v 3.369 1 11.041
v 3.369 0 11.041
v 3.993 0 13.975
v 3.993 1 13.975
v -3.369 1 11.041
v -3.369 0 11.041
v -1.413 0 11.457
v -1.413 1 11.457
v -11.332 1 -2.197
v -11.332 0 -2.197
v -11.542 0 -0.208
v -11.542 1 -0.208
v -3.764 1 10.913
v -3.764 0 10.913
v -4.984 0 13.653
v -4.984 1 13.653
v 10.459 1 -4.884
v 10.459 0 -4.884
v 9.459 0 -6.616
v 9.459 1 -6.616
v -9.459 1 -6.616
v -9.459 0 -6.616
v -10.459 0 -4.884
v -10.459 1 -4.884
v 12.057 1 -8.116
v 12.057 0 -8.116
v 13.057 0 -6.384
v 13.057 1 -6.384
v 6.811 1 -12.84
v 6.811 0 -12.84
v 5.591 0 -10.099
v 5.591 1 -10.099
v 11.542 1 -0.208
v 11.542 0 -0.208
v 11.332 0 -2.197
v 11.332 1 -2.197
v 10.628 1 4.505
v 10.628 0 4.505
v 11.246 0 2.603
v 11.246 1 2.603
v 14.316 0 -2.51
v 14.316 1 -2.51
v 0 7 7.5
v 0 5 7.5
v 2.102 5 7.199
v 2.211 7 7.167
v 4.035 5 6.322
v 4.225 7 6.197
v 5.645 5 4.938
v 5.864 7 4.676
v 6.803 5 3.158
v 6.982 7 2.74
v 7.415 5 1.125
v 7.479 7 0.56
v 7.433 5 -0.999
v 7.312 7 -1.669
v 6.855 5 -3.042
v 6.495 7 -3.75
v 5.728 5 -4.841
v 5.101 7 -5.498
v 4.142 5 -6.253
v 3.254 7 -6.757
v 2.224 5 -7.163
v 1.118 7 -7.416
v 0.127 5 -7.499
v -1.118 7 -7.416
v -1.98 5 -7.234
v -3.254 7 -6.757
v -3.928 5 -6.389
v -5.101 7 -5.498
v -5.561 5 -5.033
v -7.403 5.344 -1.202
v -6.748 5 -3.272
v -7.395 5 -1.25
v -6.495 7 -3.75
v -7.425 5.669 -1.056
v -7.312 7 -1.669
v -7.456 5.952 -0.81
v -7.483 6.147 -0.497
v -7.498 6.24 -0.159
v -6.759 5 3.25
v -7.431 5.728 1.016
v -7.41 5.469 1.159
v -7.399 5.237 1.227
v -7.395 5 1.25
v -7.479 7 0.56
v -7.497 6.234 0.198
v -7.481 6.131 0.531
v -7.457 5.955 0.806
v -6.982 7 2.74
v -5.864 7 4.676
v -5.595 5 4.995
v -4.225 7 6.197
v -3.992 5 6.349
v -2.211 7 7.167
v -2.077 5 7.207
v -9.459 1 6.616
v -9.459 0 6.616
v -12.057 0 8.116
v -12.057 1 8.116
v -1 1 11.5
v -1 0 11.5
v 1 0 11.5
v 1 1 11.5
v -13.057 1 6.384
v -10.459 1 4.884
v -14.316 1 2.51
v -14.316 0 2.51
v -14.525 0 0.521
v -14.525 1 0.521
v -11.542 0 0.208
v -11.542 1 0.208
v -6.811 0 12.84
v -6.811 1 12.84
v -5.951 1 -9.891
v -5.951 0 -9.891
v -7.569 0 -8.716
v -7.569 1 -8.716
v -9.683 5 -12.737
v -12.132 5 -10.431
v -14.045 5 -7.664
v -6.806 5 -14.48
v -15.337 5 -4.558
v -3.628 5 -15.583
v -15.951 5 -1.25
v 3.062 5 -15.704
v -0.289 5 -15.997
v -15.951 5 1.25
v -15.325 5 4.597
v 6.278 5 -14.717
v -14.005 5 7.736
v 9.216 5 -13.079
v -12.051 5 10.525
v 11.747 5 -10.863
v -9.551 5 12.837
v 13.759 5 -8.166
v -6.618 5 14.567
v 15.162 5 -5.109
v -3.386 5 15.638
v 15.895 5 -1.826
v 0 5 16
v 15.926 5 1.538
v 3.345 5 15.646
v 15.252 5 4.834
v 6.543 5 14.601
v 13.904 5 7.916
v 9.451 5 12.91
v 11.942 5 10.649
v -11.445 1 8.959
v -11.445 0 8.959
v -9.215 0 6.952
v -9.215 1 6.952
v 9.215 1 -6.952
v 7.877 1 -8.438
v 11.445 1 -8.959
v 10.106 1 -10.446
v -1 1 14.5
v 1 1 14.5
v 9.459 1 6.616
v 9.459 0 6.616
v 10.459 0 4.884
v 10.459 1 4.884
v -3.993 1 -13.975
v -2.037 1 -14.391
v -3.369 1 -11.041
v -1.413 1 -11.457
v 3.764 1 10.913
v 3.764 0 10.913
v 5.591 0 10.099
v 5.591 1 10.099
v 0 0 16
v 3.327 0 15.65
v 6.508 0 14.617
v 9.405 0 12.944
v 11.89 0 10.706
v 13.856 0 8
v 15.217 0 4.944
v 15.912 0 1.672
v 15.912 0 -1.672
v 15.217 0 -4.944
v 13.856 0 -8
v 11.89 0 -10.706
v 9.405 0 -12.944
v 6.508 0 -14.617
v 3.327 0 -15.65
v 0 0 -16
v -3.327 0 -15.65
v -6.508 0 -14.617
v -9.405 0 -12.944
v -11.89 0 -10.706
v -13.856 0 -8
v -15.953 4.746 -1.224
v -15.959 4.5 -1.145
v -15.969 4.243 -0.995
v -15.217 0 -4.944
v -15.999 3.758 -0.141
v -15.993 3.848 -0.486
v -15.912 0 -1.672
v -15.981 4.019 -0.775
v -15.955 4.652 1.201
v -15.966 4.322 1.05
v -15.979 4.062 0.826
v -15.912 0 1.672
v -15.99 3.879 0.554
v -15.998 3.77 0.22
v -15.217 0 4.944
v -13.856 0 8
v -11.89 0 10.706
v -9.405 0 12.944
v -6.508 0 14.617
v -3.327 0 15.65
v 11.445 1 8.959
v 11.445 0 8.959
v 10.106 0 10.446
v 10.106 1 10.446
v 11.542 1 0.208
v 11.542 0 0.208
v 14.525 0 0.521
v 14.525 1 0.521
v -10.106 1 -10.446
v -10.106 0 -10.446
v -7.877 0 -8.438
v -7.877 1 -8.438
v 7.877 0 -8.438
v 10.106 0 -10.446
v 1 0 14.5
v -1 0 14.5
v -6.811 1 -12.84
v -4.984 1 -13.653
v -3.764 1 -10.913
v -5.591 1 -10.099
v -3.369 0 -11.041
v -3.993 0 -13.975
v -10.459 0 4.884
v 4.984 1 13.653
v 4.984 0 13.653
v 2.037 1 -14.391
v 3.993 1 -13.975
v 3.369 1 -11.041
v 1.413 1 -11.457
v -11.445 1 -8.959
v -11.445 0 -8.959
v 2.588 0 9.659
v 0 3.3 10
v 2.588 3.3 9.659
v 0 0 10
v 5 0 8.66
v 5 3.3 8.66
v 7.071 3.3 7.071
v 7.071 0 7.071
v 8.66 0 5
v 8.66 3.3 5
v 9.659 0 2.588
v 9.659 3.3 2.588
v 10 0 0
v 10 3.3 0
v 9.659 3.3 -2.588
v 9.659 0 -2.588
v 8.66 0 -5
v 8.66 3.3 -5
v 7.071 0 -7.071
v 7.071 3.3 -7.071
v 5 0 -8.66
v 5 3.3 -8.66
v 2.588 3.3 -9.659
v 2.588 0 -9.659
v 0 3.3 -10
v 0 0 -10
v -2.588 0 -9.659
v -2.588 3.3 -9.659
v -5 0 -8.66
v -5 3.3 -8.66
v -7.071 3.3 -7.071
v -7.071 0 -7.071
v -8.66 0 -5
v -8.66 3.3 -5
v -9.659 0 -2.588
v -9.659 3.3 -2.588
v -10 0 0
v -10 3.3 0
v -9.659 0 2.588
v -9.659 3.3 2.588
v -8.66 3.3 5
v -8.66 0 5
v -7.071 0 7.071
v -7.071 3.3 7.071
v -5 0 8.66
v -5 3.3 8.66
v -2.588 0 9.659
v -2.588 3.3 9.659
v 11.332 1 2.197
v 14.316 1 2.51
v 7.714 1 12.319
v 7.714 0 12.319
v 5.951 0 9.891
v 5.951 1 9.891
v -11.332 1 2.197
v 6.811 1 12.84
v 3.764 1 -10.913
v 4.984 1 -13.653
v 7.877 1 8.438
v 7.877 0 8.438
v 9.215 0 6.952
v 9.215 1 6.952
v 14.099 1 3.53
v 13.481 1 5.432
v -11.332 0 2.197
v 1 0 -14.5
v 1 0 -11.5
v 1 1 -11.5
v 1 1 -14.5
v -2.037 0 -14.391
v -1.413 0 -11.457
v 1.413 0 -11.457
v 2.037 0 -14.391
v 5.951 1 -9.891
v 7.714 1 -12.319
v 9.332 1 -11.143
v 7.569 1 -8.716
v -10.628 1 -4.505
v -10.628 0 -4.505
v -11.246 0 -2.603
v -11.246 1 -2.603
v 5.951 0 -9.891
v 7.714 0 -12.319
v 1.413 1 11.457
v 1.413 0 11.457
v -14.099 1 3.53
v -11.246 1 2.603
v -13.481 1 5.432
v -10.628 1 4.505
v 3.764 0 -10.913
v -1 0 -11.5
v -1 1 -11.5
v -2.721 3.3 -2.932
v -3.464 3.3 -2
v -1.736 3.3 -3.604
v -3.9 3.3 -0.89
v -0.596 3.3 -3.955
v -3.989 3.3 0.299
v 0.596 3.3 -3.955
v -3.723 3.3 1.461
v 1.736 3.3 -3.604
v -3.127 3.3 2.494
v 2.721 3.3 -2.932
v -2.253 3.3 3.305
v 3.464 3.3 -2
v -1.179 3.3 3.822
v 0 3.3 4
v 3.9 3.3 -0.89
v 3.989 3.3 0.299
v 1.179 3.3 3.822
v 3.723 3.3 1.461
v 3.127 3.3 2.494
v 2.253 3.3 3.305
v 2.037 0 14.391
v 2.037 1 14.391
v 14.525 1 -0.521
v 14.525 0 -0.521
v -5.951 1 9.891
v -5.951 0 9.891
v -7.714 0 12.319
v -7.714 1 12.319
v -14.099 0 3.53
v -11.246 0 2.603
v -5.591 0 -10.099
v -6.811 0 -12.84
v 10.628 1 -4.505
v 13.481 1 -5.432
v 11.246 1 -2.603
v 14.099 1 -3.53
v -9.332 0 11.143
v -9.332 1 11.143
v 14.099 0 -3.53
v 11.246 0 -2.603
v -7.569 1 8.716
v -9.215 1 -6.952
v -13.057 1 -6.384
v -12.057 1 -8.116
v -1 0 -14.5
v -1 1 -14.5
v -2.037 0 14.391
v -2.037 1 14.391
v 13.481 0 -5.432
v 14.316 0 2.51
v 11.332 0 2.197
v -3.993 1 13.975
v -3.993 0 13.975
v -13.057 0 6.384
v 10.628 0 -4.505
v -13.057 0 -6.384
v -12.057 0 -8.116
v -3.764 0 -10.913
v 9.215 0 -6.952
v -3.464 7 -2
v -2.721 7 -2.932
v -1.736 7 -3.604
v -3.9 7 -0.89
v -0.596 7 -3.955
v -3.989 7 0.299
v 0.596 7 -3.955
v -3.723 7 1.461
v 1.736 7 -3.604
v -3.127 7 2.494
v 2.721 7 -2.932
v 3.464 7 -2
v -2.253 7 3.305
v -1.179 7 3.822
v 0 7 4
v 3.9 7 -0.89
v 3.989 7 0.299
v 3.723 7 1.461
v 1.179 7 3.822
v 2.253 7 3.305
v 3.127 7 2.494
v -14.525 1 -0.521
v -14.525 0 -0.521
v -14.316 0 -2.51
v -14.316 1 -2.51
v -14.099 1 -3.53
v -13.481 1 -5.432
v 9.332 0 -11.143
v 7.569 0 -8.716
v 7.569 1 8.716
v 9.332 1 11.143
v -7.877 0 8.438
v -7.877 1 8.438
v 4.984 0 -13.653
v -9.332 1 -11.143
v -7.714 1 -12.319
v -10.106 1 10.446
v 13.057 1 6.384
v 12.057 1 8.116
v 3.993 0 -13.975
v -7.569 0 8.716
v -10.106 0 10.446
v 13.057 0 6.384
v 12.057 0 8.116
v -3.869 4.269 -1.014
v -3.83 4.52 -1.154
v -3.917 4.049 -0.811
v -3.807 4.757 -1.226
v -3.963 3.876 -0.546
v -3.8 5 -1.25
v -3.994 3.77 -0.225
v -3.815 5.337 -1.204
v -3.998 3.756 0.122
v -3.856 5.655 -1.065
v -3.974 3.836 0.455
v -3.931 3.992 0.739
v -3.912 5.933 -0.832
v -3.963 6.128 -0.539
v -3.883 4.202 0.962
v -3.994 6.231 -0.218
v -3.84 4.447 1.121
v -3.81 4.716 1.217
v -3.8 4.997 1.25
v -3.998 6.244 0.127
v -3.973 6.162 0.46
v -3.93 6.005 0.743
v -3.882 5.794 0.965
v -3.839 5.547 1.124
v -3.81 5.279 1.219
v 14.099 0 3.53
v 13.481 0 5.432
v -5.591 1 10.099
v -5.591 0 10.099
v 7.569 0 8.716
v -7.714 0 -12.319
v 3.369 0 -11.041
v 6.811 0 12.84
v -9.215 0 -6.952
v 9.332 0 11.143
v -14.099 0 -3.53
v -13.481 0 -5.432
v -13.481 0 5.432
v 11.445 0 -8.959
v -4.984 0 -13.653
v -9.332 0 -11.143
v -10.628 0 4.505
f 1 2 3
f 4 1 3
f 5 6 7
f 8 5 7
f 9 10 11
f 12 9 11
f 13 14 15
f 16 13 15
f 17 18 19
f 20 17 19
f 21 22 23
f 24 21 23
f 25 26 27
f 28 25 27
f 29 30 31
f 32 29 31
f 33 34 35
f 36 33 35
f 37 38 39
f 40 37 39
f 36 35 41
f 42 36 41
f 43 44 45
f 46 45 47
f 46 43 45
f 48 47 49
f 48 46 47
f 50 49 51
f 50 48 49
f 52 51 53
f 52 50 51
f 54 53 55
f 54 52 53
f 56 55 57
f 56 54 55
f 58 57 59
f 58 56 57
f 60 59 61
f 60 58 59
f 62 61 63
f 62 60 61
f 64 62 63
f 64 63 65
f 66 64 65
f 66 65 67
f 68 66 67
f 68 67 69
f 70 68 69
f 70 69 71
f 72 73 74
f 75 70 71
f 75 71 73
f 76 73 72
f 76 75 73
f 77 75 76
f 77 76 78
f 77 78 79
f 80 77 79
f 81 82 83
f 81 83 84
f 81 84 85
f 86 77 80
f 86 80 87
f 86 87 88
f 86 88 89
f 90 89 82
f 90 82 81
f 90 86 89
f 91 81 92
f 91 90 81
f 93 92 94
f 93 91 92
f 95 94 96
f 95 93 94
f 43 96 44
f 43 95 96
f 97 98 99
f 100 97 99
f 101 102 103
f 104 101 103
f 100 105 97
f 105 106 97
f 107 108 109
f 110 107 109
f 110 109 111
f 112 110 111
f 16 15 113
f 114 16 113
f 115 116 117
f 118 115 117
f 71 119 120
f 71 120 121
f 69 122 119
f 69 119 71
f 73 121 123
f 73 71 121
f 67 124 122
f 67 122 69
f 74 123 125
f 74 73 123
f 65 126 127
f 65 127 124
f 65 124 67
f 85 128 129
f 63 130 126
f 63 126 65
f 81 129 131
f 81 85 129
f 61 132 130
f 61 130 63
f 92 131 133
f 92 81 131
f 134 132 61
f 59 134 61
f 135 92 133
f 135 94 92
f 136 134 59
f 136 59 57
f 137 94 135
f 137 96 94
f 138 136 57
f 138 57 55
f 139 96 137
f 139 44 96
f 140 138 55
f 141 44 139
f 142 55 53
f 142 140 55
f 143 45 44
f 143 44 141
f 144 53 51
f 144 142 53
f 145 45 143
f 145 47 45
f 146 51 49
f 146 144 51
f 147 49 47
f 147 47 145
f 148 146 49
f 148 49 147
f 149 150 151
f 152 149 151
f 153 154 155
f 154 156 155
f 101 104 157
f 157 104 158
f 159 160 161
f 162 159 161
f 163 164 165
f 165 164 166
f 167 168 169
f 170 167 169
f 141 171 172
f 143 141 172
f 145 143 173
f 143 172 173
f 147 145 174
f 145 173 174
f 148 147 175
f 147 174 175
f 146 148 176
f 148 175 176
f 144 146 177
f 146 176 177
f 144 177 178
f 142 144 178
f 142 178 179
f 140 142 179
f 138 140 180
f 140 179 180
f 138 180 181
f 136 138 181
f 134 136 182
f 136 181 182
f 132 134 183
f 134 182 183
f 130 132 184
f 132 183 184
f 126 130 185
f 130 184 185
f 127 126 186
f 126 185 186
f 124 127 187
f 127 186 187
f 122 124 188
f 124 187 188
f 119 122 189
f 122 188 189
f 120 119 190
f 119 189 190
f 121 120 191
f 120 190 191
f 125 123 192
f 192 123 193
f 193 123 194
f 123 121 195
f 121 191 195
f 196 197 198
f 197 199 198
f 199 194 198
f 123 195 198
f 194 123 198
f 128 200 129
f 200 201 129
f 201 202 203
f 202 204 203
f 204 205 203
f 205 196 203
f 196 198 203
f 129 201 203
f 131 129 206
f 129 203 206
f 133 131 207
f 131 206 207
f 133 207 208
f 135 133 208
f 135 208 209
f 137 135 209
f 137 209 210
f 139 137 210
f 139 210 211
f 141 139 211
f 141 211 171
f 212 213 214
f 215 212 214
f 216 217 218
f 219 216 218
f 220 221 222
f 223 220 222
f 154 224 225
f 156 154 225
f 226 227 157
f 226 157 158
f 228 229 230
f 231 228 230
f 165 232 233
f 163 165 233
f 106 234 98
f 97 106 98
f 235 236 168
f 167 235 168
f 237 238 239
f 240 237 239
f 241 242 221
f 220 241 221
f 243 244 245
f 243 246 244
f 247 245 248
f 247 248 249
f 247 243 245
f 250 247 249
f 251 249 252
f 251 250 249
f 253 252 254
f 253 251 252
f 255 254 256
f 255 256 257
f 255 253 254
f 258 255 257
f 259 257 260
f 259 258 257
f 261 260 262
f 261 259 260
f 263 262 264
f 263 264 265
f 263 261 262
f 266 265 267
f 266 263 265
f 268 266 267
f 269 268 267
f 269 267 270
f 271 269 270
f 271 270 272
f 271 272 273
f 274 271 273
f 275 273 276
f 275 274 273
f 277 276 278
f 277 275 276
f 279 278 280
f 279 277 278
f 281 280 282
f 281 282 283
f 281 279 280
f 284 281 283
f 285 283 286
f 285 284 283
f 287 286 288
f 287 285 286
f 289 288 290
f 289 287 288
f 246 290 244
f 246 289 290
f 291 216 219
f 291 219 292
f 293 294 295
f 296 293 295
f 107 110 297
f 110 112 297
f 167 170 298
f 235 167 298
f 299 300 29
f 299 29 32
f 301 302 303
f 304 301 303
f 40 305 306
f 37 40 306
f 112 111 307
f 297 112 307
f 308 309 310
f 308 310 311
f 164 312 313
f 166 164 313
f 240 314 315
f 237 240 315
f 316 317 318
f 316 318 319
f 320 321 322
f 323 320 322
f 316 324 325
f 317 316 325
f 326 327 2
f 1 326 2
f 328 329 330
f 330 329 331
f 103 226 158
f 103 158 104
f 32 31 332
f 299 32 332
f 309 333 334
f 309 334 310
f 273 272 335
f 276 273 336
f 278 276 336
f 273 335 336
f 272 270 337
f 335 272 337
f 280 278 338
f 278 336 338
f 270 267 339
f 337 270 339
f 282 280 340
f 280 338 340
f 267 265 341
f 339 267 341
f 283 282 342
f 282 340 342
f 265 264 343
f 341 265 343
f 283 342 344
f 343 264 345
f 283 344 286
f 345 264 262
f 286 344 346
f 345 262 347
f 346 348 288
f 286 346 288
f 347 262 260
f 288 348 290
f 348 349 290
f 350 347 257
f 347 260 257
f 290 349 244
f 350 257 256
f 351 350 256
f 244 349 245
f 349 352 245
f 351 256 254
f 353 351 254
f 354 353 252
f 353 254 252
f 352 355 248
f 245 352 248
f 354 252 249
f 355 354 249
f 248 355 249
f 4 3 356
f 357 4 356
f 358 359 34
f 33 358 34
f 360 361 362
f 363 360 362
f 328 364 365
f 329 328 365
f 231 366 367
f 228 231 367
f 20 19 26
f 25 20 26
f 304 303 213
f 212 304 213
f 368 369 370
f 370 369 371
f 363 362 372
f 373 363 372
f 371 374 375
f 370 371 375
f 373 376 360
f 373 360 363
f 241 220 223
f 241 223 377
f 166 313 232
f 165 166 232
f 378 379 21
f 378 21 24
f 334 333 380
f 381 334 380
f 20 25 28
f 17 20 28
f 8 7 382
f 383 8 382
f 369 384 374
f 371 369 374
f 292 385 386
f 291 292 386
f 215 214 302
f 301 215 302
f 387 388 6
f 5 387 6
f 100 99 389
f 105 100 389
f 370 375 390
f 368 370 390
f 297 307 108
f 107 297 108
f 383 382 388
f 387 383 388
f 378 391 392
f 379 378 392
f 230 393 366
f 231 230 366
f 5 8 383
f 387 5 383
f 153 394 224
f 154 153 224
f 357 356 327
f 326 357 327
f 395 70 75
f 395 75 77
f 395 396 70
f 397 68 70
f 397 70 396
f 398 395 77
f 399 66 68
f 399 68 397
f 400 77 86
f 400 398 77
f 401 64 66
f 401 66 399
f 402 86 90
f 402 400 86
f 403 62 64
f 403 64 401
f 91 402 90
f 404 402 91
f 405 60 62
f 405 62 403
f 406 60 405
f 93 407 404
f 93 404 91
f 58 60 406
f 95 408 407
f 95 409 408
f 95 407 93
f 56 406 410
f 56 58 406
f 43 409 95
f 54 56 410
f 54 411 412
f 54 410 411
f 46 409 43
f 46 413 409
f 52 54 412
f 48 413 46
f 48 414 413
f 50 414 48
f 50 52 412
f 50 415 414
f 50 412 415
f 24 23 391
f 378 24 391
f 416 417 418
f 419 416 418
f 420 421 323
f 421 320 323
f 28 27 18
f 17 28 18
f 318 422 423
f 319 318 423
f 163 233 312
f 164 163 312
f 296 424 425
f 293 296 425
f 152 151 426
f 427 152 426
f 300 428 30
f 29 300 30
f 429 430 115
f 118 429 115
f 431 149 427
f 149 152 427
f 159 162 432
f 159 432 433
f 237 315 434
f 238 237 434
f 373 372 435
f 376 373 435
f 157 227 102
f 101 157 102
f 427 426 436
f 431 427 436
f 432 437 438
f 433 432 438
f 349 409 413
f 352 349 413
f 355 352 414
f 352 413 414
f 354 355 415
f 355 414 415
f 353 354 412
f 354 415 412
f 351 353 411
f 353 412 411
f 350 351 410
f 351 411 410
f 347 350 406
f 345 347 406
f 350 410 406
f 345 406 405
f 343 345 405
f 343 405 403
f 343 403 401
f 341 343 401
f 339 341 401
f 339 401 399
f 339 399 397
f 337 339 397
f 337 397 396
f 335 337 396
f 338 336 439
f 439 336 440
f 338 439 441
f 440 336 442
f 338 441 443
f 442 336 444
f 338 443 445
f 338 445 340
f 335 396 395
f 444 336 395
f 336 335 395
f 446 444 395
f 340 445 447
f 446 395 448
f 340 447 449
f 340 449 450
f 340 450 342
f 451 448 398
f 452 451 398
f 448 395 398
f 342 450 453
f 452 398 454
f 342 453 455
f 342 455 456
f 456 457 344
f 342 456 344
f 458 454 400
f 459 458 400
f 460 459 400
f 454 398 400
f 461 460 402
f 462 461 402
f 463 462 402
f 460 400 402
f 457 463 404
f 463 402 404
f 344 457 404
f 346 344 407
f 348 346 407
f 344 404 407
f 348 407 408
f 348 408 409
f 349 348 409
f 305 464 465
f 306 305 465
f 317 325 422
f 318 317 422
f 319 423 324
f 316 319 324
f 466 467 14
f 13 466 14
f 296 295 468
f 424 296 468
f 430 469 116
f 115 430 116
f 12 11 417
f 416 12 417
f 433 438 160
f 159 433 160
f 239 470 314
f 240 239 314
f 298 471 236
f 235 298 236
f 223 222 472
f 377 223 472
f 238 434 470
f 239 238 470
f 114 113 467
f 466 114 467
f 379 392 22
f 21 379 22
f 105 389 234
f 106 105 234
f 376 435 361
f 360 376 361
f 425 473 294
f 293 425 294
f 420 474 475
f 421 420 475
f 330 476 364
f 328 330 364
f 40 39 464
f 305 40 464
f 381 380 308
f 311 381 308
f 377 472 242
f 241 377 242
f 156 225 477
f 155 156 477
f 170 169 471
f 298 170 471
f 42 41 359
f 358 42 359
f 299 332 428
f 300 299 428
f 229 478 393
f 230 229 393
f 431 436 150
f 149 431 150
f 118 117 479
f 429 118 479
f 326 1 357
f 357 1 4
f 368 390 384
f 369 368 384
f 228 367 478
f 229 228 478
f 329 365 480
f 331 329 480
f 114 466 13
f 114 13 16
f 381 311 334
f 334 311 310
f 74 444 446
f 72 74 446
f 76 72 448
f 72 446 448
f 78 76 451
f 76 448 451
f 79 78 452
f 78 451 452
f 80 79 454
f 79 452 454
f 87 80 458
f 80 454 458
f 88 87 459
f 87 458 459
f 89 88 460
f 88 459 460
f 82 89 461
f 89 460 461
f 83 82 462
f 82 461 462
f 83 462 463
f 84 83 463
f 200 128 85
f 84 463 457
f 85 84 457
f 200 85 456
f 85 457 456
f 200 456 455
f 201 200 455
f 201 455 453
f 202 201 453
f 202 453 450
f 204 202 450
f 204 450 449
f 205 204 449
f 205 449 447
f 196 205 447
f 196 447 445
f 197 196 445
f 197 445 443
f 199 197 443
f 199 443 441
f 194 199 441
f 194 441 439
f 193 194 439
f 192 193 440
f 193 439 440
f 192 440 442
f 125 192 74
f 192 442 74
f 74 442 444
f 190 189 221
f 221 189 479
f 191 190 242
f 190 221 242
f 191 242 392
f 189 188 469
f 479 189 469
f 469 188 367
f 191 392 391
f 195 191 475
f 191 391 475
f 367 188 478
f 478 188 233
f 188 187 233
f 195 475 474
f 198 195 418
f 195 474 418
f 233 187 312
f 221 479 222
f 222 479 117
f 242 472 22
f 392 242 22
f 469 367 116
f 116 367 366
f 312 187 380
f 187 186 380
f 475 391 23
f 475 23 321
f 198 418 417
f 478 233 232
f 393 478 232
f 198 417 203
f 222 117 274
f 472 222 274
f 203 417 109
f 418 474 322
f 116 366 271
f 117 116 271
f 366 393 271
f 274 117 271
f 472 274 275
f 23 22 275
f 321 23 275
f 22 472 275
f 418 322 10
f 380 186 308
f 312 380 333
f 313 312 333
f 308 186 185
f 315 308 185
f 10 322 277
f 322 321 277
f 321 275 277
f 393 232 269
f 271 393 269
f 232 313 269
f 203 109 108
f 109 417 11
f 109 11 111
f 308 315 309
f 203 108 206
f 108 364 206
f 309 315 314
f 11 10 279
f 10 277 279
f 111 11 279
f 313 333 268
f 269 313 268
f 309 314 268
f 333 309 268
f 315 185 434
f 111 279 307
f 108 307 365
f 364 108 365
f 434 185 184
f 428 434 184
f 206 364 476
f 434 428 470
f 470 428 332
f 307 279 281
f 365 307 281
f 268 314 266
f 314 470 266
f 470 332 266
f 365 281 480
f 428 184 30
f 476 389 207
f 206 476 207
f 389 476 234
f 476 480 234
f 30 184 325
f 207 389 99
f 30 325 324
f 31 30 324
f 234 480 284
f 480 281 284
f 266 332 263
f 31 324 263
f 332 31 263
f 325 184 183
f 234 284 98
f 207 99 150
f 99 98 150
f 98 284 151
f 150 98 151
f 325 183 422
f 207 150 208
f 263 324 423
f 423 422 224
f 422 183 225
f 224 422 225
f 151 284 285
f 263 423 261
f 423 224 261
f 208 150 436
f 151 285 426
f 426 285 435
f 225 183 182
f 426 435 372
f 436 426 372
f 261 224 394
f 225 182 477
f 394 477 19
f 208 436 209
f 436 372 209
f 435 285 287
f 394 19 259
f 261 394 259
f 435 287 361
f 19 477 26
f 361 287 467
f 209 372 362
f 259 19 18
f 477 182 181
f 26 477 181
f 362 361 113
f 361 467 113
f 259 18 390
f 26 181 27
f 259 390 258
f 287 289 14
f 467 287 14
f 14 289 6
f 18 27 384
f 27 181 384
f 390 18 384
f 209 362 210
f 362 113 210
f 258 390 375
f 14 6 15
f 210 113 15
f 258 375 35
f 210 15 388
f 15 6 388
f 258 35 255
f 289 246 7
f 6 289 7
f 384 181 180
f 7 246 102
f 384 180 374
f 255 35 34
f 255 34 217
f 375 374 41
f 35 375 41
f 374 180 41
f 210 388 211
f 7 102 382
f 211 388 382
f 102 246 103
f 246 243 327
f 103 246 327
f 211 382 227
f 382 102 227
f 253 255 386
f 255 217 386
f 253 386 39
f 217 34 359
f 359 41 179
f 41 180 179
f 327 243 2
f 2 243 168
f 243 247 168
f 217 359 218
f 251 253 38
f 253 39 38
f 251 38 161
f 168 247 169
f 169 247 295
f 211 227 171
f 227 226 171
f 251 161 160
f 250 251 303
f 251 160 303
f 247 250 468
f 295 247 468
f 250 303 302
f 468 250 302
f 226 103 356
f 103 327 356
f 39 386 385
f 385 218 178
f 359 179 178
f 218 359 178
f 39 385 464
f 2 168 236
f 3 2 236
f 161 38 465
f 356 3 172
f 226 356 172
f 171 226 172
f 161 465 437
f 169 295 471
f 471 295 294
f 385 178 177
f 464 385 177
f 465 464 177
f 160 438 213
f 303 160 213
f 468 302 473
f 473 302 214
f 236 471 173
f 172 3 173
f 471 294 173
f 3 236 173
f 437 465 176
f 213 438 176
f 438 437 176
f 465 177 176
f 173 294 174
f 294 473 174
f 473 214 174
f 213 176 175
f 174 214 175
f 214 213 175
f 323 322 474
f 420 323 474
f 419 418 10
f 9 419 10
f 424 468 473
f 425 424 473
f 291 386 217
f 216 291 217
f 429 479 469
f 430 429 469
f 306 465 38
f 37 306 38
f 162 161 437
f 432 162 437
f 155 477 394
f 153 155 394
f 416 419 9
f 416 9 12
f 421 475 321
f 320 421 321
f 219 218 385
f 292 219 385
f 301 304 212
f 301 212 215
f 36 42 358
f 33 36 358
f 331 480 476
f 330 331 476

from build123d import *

# Parameters (mm, degrees)
SKETCH1_R           = 16
SKETCH1_W           = 2
SKETCH1_H           = 3
SKETCH1_R_2         = 10
BOSS_EXTRUDE3_DEPTH = 1
SKETCH2_R           = 16
SKETCH2_R_2         = 10
BOSS_EXTRUDE4_DEPTH = 1.5
SKETCH3_R           = 16
SKETCH3_R_2         = 10
BOSS_EXTRUDE5_DEPTH = 0.8
SKETCH4_R           = 16
BOSS_EXTRUDE6_DEPTH = 1.7
SKETCH5_R           = 4
CUT_EXTRUDE3_DEPTH  = 1.7
BOSS_EXTRUDE8_START = 2
SKETCH6_R           = 7.5
SKETCH6_R_2         = 4
BOSS_EXTRUDE8_DEPTH = 2
SKETCH8_R           = 1.25
CUT_EXTRUDE5_DEPTH  = 29


with BuildPart() as part:
    # Sketch1 → Boss-Extrude3 (new body)
    with BuildSketch(Plane(origin=(0, 0, 0), x_dir=(1, 0, 0), z_dir=(0, 1, 0))):
        with Locations(Location((0, 0, 0), (0, 0, 270))):
            Circle(SKETCH1_R)
        Polygon((3.992867118, 13.97522852), (3.369132045, 11.040785718), (1.412836844, 11.456609099), (2.036571916, 14.391051901), align=None, mode=Mode.SUBTRACT)
        with Locations((0, 13)):
            Rectangle(SKETCH1_W, SKETCH1_H, mode=Mode.SUBTRACT)
        Polygon((6.811226782, 12.839672493), (5.591016853, 10.09903612), (3.763925938, 10.912509406), (4.984135867, 13.653145779), align=None, mode=Mode.SUBTRACT)
        Polygon((-2.036571916, 14.391051901), (-1.412836844, 11.456609099), (-3.369132045, 11.040785718), (-3.992867118, 13.97522852), align=None, mode=Mode.SUBTRACT)
        Polygon((9.331903153, 11.142961166), (7.568547396, 8.715910183), (5.950513407, 9.891480688), (7.713869164, 12.318531671), align=None, mode=Mode.SUBTRACT)
        Polygon((-4.984135867, 13.653145779), (-3.763925938, 10.912509406), (-5.591016853, 10.09903612), (-6.811226782, 12.839672493), align=None, mode=Mode.SUBTRACT)
        Polygon((-9.331903153, -11.142961166), (-7.568547396, -8.715910183), (-5.950513407, -9.891480688), (-7.713869164, -12.318531671), align=None, mode=Mode.SUBTRACT)
        Polygon((-11.444730576, -8.959248967), (-9.215296099, -6.951857148), (-7.877034887, -8.438146799), (-10.106469363, -10.445538618), align=None, mode=Mode.SUBTRACT)
        Polygon((-6.811226782, -12.839672493), (-5.591016853, -10.09903612), (-3.763925938, -10.912509406), (-4.984135867, -13.653145779), align=None, mode=Mode.SUBTRACT)
        with Locations((0, -13)):
            Rectangle(SKETCH1_W, SKETCH1_H, mode=Mode.SUBTRACT)
        Polygon((-1.412836844, -11.456609099), (-2.036571916, -14.391051901), (-3.992867118, -13.97522852), (-3.369132045, -11.040785718), align=None, mode=Mode.SUBTRACT)
        Polygon((-13.057368355, -6.383974596), (-10.459292144, -4.883974596), (-9.459292144, -6.616025404), (-12.057368355, -8.116025404), align=None, mode=Mode.SUBTRACT)
        Polygon((-14.099336481, -3.529689902), (-11.246166932, -2.602638919), (-10.628132943, -4.504751952), (-13.481302492, -5.431802935), align=None, mode=Mode.SUBTRACT)
        Polygon((-14.525095946, -0.521140822), (-11.54153026, -0.207555432), (-11.332473333, -2.196599223), (-14.31603902, -2.510184613), align=None, mode=Mode.SUBTRACT)
        Polygon((2.036571916, -14.391051901), (1.412836844, -11.456609099), (3.369132045, -11.040785718), (3.992867118, -13.97522852), align=None, mode=Mode.SUBTRACT)
        Polygon((4.984135867, -13.653145779), (3.763925938, -10.912509406), (5.591016853, -10.09903612), (6.811226782, -12.839672493), align=None, mode=Mode.SUBTRACT)
        Polygon((7.713869164, -12.318531671), (5.950513407, -9.891480688), (7.568547396, -8.715910183), (9.331903153, -11.142961166), align=None, mode=Mode.SUBTRACT)
        Polygon((10.106469363, -10.445538618), (7.877034887, -8.438146799), (9.215296099, -6.951857148), (11.444730576, -8.959248967), align=None, mode=Mode.SUBTRACT)
        Polygon((12.057368355, -8.116025404), (9.459292144, -6.616025404), (10.459292144, -4.883974596), (13.057368355, -6.383974596), align=None, mode=Mode.SUBTRACT)
        Polygon((13.481302492, -5.431802935), (10.628132943, -4.504751952), (11.246166932, -2.602638919), (14.099336481, -3.529689902), align=None, mode=Mode.SUBTRACT)
        Polygon((14.31603902, -2.510184613), (11.332473333, -2.196599223), (11.54153026, -0.207555432), (14.525095946, -0.521140822), align=None, mode=Mode.SUBTRACT)
        Polygon((-14.31603902, 2.510184613), (-11.332473333, 2.196599223), (-11.54153026, 0.207555432), (-14.525095946, 0.521140822), align=None, mode=Mode.SUBTRACT)
        Polygon((-13.481302492, 5.431802935), (-10.628132943, 4.504751952), (-11.246166932, 2.602638919), (-14.099336481, 3.529689902), align=None, mode=Mode.SUBTRACT)
        with Locations(Location((0, 0, 0), (0, 0, 270))):
            Circle(SKETCH1_R_2, mode=Mode.SUBTRACT)
        Polygon((-12.057368355, 8.116025404), (-9.459292144, 6.616025404), (-10.459292144, 4.883974596), (-13.057368355, 6.383974596), align=None, mode=Mode.SUBTRACT)
        Polygon((-10.106469363, 10.445538618), (-7.877034887, 8.438146799), (-9.215296099, 6.951857148), (-11.444730576, 8.959248967), align=None, mode=Mode.SUBTRACT)
        Polygon((-7.713869164, 12.318531671), (-5.950513407, 9.891480688), (-7.568547396, 8.715910183), (-9.331903153, 11.142961166), align=None, mode=Mode.SUBTRACT)
        Polygon((14.525095946, 0.521140822), (11.54153026, 0.207555432), (11.332473333, 2.196599223), (14.31603902, 2.510184613), align=None, mode=Mode.SUBTRACT)
        Polygon((14.099336481, 3.529689902), (11.246166932, 2.602638919), (10.628132943, 4.504751952), (13.481302492, 5.431802935), align=None, mode=Mode.SUBTRACT)
        Polygon((7.877034887, 8.438146799), (10.106469363, 10.445538618), (11.444730576, 8.959248967), (9.215296099, 6.951857148), align=None, mode=Mode.SUBTRACT)
        Polygon((13.057368355, 6.383974596), (10.459292144, 4.883974596), (9.459292144, 6.616025404), (12.057368355, 8.116025404), align=None, mode=Mode.SUBTRACT)
    extrude(amount=BOSS_EXTRUDE3_DEPTH)

    # Sketch2 → Boss-Extrude4 (add)
    with BuildSketch(Plane(origin=(0, 1, 0), x_dir=(1, 0, 0), z_dir=(0, 1, 0))):
        with Locations(Location((0, 0, 0), (0, 0, 270))):
            Circle(SKETCH2_R)
        with Locations(Location((0, 0, 0), (0, 0, 270))):
            Circle(SKETCH2_R_2, mode=Mode.SUBTRACT)
    extrude(amount=BOSS_EXTRUDE4_DEPTH)

    # Sketch3 → Boss-Extrude5 (add)
    with BuildSketch(Plane(origin=(0, 2.5, 0), x_dir=(1, 0, 0), z_dir=(0, 1, 0))):
        with Locations(Location((0, 0, 0), (0, 0, 270))):
            Circle(SKETCH3_R)
        with Locations(Location((0, 0, 0), (0, 0, 270))):
            Circle(SKETCH3_R_2, mode=Mode.SUBTRACT)
    extrude(amount=BOSS_EXTRUDE5_DEPTH)

    # Sketch4 → Boss-Extrude6 (add)
    with BuildSketch(Plane(origin=(0, 3.3, 0), x_dir=(1, 0, 0), z_dir=(0, 1, 0))):
        with Locations(Location((0, 0, 0), (0, 0, 270))):
            Circle(SKETCH4_R)
    extrude(amount=BOSS_EXTRUDE6_DEPTH)

    # Sketch5 → Cut-Extrude3 (cut)
    with BuildSketch(Plane(origin=(0, 5, 0), x_dir=(1, 0, 0), z_dir=(0, 1, 0))):
        with Locations(Location((0, 0, 0), (0, 0, 270))):
            Circle(SKETCH5_R)
    extrude(amount=-CUT_EXTRUDE3_DEPTH, mode=Mode.SUBTRACT)

    # Sketch6 → Boss-Extrude8 (add)
    with BuildSketch(Plane(origin=(0, 5, 0), x_dir=(1, 0, 0), z_dir=(0, 1, 0)).offset(BOSS_EXTRUDE8_START)):
        with Locations(Location((0, 0, 0), (0, 0, 270))):
            Circle(SKETCH6_R)
        with Locations(Location((0, 0, 0), (0, 0, 270))):
            Circle(SKETCH6_R_2, mode=Mode.SUBTRACT)
    extrude(amount=-BOSS_EXTRUDE8_DEPTH)

    # Sketch8 → Cut-Extrude5 (cut)
    with BuildSketch(Plane(origin=(0, 0, 0), x_dir=(0, 0, -1), z_dir=(1, 0, 0))):
        with Locations((0, 5)):
            Circle(SKETCH8_R)
    extrude(amount=-CUT_EXTRUDE5_DEPTH, mode=Mode.SUBTRACT)


solid = part.part
